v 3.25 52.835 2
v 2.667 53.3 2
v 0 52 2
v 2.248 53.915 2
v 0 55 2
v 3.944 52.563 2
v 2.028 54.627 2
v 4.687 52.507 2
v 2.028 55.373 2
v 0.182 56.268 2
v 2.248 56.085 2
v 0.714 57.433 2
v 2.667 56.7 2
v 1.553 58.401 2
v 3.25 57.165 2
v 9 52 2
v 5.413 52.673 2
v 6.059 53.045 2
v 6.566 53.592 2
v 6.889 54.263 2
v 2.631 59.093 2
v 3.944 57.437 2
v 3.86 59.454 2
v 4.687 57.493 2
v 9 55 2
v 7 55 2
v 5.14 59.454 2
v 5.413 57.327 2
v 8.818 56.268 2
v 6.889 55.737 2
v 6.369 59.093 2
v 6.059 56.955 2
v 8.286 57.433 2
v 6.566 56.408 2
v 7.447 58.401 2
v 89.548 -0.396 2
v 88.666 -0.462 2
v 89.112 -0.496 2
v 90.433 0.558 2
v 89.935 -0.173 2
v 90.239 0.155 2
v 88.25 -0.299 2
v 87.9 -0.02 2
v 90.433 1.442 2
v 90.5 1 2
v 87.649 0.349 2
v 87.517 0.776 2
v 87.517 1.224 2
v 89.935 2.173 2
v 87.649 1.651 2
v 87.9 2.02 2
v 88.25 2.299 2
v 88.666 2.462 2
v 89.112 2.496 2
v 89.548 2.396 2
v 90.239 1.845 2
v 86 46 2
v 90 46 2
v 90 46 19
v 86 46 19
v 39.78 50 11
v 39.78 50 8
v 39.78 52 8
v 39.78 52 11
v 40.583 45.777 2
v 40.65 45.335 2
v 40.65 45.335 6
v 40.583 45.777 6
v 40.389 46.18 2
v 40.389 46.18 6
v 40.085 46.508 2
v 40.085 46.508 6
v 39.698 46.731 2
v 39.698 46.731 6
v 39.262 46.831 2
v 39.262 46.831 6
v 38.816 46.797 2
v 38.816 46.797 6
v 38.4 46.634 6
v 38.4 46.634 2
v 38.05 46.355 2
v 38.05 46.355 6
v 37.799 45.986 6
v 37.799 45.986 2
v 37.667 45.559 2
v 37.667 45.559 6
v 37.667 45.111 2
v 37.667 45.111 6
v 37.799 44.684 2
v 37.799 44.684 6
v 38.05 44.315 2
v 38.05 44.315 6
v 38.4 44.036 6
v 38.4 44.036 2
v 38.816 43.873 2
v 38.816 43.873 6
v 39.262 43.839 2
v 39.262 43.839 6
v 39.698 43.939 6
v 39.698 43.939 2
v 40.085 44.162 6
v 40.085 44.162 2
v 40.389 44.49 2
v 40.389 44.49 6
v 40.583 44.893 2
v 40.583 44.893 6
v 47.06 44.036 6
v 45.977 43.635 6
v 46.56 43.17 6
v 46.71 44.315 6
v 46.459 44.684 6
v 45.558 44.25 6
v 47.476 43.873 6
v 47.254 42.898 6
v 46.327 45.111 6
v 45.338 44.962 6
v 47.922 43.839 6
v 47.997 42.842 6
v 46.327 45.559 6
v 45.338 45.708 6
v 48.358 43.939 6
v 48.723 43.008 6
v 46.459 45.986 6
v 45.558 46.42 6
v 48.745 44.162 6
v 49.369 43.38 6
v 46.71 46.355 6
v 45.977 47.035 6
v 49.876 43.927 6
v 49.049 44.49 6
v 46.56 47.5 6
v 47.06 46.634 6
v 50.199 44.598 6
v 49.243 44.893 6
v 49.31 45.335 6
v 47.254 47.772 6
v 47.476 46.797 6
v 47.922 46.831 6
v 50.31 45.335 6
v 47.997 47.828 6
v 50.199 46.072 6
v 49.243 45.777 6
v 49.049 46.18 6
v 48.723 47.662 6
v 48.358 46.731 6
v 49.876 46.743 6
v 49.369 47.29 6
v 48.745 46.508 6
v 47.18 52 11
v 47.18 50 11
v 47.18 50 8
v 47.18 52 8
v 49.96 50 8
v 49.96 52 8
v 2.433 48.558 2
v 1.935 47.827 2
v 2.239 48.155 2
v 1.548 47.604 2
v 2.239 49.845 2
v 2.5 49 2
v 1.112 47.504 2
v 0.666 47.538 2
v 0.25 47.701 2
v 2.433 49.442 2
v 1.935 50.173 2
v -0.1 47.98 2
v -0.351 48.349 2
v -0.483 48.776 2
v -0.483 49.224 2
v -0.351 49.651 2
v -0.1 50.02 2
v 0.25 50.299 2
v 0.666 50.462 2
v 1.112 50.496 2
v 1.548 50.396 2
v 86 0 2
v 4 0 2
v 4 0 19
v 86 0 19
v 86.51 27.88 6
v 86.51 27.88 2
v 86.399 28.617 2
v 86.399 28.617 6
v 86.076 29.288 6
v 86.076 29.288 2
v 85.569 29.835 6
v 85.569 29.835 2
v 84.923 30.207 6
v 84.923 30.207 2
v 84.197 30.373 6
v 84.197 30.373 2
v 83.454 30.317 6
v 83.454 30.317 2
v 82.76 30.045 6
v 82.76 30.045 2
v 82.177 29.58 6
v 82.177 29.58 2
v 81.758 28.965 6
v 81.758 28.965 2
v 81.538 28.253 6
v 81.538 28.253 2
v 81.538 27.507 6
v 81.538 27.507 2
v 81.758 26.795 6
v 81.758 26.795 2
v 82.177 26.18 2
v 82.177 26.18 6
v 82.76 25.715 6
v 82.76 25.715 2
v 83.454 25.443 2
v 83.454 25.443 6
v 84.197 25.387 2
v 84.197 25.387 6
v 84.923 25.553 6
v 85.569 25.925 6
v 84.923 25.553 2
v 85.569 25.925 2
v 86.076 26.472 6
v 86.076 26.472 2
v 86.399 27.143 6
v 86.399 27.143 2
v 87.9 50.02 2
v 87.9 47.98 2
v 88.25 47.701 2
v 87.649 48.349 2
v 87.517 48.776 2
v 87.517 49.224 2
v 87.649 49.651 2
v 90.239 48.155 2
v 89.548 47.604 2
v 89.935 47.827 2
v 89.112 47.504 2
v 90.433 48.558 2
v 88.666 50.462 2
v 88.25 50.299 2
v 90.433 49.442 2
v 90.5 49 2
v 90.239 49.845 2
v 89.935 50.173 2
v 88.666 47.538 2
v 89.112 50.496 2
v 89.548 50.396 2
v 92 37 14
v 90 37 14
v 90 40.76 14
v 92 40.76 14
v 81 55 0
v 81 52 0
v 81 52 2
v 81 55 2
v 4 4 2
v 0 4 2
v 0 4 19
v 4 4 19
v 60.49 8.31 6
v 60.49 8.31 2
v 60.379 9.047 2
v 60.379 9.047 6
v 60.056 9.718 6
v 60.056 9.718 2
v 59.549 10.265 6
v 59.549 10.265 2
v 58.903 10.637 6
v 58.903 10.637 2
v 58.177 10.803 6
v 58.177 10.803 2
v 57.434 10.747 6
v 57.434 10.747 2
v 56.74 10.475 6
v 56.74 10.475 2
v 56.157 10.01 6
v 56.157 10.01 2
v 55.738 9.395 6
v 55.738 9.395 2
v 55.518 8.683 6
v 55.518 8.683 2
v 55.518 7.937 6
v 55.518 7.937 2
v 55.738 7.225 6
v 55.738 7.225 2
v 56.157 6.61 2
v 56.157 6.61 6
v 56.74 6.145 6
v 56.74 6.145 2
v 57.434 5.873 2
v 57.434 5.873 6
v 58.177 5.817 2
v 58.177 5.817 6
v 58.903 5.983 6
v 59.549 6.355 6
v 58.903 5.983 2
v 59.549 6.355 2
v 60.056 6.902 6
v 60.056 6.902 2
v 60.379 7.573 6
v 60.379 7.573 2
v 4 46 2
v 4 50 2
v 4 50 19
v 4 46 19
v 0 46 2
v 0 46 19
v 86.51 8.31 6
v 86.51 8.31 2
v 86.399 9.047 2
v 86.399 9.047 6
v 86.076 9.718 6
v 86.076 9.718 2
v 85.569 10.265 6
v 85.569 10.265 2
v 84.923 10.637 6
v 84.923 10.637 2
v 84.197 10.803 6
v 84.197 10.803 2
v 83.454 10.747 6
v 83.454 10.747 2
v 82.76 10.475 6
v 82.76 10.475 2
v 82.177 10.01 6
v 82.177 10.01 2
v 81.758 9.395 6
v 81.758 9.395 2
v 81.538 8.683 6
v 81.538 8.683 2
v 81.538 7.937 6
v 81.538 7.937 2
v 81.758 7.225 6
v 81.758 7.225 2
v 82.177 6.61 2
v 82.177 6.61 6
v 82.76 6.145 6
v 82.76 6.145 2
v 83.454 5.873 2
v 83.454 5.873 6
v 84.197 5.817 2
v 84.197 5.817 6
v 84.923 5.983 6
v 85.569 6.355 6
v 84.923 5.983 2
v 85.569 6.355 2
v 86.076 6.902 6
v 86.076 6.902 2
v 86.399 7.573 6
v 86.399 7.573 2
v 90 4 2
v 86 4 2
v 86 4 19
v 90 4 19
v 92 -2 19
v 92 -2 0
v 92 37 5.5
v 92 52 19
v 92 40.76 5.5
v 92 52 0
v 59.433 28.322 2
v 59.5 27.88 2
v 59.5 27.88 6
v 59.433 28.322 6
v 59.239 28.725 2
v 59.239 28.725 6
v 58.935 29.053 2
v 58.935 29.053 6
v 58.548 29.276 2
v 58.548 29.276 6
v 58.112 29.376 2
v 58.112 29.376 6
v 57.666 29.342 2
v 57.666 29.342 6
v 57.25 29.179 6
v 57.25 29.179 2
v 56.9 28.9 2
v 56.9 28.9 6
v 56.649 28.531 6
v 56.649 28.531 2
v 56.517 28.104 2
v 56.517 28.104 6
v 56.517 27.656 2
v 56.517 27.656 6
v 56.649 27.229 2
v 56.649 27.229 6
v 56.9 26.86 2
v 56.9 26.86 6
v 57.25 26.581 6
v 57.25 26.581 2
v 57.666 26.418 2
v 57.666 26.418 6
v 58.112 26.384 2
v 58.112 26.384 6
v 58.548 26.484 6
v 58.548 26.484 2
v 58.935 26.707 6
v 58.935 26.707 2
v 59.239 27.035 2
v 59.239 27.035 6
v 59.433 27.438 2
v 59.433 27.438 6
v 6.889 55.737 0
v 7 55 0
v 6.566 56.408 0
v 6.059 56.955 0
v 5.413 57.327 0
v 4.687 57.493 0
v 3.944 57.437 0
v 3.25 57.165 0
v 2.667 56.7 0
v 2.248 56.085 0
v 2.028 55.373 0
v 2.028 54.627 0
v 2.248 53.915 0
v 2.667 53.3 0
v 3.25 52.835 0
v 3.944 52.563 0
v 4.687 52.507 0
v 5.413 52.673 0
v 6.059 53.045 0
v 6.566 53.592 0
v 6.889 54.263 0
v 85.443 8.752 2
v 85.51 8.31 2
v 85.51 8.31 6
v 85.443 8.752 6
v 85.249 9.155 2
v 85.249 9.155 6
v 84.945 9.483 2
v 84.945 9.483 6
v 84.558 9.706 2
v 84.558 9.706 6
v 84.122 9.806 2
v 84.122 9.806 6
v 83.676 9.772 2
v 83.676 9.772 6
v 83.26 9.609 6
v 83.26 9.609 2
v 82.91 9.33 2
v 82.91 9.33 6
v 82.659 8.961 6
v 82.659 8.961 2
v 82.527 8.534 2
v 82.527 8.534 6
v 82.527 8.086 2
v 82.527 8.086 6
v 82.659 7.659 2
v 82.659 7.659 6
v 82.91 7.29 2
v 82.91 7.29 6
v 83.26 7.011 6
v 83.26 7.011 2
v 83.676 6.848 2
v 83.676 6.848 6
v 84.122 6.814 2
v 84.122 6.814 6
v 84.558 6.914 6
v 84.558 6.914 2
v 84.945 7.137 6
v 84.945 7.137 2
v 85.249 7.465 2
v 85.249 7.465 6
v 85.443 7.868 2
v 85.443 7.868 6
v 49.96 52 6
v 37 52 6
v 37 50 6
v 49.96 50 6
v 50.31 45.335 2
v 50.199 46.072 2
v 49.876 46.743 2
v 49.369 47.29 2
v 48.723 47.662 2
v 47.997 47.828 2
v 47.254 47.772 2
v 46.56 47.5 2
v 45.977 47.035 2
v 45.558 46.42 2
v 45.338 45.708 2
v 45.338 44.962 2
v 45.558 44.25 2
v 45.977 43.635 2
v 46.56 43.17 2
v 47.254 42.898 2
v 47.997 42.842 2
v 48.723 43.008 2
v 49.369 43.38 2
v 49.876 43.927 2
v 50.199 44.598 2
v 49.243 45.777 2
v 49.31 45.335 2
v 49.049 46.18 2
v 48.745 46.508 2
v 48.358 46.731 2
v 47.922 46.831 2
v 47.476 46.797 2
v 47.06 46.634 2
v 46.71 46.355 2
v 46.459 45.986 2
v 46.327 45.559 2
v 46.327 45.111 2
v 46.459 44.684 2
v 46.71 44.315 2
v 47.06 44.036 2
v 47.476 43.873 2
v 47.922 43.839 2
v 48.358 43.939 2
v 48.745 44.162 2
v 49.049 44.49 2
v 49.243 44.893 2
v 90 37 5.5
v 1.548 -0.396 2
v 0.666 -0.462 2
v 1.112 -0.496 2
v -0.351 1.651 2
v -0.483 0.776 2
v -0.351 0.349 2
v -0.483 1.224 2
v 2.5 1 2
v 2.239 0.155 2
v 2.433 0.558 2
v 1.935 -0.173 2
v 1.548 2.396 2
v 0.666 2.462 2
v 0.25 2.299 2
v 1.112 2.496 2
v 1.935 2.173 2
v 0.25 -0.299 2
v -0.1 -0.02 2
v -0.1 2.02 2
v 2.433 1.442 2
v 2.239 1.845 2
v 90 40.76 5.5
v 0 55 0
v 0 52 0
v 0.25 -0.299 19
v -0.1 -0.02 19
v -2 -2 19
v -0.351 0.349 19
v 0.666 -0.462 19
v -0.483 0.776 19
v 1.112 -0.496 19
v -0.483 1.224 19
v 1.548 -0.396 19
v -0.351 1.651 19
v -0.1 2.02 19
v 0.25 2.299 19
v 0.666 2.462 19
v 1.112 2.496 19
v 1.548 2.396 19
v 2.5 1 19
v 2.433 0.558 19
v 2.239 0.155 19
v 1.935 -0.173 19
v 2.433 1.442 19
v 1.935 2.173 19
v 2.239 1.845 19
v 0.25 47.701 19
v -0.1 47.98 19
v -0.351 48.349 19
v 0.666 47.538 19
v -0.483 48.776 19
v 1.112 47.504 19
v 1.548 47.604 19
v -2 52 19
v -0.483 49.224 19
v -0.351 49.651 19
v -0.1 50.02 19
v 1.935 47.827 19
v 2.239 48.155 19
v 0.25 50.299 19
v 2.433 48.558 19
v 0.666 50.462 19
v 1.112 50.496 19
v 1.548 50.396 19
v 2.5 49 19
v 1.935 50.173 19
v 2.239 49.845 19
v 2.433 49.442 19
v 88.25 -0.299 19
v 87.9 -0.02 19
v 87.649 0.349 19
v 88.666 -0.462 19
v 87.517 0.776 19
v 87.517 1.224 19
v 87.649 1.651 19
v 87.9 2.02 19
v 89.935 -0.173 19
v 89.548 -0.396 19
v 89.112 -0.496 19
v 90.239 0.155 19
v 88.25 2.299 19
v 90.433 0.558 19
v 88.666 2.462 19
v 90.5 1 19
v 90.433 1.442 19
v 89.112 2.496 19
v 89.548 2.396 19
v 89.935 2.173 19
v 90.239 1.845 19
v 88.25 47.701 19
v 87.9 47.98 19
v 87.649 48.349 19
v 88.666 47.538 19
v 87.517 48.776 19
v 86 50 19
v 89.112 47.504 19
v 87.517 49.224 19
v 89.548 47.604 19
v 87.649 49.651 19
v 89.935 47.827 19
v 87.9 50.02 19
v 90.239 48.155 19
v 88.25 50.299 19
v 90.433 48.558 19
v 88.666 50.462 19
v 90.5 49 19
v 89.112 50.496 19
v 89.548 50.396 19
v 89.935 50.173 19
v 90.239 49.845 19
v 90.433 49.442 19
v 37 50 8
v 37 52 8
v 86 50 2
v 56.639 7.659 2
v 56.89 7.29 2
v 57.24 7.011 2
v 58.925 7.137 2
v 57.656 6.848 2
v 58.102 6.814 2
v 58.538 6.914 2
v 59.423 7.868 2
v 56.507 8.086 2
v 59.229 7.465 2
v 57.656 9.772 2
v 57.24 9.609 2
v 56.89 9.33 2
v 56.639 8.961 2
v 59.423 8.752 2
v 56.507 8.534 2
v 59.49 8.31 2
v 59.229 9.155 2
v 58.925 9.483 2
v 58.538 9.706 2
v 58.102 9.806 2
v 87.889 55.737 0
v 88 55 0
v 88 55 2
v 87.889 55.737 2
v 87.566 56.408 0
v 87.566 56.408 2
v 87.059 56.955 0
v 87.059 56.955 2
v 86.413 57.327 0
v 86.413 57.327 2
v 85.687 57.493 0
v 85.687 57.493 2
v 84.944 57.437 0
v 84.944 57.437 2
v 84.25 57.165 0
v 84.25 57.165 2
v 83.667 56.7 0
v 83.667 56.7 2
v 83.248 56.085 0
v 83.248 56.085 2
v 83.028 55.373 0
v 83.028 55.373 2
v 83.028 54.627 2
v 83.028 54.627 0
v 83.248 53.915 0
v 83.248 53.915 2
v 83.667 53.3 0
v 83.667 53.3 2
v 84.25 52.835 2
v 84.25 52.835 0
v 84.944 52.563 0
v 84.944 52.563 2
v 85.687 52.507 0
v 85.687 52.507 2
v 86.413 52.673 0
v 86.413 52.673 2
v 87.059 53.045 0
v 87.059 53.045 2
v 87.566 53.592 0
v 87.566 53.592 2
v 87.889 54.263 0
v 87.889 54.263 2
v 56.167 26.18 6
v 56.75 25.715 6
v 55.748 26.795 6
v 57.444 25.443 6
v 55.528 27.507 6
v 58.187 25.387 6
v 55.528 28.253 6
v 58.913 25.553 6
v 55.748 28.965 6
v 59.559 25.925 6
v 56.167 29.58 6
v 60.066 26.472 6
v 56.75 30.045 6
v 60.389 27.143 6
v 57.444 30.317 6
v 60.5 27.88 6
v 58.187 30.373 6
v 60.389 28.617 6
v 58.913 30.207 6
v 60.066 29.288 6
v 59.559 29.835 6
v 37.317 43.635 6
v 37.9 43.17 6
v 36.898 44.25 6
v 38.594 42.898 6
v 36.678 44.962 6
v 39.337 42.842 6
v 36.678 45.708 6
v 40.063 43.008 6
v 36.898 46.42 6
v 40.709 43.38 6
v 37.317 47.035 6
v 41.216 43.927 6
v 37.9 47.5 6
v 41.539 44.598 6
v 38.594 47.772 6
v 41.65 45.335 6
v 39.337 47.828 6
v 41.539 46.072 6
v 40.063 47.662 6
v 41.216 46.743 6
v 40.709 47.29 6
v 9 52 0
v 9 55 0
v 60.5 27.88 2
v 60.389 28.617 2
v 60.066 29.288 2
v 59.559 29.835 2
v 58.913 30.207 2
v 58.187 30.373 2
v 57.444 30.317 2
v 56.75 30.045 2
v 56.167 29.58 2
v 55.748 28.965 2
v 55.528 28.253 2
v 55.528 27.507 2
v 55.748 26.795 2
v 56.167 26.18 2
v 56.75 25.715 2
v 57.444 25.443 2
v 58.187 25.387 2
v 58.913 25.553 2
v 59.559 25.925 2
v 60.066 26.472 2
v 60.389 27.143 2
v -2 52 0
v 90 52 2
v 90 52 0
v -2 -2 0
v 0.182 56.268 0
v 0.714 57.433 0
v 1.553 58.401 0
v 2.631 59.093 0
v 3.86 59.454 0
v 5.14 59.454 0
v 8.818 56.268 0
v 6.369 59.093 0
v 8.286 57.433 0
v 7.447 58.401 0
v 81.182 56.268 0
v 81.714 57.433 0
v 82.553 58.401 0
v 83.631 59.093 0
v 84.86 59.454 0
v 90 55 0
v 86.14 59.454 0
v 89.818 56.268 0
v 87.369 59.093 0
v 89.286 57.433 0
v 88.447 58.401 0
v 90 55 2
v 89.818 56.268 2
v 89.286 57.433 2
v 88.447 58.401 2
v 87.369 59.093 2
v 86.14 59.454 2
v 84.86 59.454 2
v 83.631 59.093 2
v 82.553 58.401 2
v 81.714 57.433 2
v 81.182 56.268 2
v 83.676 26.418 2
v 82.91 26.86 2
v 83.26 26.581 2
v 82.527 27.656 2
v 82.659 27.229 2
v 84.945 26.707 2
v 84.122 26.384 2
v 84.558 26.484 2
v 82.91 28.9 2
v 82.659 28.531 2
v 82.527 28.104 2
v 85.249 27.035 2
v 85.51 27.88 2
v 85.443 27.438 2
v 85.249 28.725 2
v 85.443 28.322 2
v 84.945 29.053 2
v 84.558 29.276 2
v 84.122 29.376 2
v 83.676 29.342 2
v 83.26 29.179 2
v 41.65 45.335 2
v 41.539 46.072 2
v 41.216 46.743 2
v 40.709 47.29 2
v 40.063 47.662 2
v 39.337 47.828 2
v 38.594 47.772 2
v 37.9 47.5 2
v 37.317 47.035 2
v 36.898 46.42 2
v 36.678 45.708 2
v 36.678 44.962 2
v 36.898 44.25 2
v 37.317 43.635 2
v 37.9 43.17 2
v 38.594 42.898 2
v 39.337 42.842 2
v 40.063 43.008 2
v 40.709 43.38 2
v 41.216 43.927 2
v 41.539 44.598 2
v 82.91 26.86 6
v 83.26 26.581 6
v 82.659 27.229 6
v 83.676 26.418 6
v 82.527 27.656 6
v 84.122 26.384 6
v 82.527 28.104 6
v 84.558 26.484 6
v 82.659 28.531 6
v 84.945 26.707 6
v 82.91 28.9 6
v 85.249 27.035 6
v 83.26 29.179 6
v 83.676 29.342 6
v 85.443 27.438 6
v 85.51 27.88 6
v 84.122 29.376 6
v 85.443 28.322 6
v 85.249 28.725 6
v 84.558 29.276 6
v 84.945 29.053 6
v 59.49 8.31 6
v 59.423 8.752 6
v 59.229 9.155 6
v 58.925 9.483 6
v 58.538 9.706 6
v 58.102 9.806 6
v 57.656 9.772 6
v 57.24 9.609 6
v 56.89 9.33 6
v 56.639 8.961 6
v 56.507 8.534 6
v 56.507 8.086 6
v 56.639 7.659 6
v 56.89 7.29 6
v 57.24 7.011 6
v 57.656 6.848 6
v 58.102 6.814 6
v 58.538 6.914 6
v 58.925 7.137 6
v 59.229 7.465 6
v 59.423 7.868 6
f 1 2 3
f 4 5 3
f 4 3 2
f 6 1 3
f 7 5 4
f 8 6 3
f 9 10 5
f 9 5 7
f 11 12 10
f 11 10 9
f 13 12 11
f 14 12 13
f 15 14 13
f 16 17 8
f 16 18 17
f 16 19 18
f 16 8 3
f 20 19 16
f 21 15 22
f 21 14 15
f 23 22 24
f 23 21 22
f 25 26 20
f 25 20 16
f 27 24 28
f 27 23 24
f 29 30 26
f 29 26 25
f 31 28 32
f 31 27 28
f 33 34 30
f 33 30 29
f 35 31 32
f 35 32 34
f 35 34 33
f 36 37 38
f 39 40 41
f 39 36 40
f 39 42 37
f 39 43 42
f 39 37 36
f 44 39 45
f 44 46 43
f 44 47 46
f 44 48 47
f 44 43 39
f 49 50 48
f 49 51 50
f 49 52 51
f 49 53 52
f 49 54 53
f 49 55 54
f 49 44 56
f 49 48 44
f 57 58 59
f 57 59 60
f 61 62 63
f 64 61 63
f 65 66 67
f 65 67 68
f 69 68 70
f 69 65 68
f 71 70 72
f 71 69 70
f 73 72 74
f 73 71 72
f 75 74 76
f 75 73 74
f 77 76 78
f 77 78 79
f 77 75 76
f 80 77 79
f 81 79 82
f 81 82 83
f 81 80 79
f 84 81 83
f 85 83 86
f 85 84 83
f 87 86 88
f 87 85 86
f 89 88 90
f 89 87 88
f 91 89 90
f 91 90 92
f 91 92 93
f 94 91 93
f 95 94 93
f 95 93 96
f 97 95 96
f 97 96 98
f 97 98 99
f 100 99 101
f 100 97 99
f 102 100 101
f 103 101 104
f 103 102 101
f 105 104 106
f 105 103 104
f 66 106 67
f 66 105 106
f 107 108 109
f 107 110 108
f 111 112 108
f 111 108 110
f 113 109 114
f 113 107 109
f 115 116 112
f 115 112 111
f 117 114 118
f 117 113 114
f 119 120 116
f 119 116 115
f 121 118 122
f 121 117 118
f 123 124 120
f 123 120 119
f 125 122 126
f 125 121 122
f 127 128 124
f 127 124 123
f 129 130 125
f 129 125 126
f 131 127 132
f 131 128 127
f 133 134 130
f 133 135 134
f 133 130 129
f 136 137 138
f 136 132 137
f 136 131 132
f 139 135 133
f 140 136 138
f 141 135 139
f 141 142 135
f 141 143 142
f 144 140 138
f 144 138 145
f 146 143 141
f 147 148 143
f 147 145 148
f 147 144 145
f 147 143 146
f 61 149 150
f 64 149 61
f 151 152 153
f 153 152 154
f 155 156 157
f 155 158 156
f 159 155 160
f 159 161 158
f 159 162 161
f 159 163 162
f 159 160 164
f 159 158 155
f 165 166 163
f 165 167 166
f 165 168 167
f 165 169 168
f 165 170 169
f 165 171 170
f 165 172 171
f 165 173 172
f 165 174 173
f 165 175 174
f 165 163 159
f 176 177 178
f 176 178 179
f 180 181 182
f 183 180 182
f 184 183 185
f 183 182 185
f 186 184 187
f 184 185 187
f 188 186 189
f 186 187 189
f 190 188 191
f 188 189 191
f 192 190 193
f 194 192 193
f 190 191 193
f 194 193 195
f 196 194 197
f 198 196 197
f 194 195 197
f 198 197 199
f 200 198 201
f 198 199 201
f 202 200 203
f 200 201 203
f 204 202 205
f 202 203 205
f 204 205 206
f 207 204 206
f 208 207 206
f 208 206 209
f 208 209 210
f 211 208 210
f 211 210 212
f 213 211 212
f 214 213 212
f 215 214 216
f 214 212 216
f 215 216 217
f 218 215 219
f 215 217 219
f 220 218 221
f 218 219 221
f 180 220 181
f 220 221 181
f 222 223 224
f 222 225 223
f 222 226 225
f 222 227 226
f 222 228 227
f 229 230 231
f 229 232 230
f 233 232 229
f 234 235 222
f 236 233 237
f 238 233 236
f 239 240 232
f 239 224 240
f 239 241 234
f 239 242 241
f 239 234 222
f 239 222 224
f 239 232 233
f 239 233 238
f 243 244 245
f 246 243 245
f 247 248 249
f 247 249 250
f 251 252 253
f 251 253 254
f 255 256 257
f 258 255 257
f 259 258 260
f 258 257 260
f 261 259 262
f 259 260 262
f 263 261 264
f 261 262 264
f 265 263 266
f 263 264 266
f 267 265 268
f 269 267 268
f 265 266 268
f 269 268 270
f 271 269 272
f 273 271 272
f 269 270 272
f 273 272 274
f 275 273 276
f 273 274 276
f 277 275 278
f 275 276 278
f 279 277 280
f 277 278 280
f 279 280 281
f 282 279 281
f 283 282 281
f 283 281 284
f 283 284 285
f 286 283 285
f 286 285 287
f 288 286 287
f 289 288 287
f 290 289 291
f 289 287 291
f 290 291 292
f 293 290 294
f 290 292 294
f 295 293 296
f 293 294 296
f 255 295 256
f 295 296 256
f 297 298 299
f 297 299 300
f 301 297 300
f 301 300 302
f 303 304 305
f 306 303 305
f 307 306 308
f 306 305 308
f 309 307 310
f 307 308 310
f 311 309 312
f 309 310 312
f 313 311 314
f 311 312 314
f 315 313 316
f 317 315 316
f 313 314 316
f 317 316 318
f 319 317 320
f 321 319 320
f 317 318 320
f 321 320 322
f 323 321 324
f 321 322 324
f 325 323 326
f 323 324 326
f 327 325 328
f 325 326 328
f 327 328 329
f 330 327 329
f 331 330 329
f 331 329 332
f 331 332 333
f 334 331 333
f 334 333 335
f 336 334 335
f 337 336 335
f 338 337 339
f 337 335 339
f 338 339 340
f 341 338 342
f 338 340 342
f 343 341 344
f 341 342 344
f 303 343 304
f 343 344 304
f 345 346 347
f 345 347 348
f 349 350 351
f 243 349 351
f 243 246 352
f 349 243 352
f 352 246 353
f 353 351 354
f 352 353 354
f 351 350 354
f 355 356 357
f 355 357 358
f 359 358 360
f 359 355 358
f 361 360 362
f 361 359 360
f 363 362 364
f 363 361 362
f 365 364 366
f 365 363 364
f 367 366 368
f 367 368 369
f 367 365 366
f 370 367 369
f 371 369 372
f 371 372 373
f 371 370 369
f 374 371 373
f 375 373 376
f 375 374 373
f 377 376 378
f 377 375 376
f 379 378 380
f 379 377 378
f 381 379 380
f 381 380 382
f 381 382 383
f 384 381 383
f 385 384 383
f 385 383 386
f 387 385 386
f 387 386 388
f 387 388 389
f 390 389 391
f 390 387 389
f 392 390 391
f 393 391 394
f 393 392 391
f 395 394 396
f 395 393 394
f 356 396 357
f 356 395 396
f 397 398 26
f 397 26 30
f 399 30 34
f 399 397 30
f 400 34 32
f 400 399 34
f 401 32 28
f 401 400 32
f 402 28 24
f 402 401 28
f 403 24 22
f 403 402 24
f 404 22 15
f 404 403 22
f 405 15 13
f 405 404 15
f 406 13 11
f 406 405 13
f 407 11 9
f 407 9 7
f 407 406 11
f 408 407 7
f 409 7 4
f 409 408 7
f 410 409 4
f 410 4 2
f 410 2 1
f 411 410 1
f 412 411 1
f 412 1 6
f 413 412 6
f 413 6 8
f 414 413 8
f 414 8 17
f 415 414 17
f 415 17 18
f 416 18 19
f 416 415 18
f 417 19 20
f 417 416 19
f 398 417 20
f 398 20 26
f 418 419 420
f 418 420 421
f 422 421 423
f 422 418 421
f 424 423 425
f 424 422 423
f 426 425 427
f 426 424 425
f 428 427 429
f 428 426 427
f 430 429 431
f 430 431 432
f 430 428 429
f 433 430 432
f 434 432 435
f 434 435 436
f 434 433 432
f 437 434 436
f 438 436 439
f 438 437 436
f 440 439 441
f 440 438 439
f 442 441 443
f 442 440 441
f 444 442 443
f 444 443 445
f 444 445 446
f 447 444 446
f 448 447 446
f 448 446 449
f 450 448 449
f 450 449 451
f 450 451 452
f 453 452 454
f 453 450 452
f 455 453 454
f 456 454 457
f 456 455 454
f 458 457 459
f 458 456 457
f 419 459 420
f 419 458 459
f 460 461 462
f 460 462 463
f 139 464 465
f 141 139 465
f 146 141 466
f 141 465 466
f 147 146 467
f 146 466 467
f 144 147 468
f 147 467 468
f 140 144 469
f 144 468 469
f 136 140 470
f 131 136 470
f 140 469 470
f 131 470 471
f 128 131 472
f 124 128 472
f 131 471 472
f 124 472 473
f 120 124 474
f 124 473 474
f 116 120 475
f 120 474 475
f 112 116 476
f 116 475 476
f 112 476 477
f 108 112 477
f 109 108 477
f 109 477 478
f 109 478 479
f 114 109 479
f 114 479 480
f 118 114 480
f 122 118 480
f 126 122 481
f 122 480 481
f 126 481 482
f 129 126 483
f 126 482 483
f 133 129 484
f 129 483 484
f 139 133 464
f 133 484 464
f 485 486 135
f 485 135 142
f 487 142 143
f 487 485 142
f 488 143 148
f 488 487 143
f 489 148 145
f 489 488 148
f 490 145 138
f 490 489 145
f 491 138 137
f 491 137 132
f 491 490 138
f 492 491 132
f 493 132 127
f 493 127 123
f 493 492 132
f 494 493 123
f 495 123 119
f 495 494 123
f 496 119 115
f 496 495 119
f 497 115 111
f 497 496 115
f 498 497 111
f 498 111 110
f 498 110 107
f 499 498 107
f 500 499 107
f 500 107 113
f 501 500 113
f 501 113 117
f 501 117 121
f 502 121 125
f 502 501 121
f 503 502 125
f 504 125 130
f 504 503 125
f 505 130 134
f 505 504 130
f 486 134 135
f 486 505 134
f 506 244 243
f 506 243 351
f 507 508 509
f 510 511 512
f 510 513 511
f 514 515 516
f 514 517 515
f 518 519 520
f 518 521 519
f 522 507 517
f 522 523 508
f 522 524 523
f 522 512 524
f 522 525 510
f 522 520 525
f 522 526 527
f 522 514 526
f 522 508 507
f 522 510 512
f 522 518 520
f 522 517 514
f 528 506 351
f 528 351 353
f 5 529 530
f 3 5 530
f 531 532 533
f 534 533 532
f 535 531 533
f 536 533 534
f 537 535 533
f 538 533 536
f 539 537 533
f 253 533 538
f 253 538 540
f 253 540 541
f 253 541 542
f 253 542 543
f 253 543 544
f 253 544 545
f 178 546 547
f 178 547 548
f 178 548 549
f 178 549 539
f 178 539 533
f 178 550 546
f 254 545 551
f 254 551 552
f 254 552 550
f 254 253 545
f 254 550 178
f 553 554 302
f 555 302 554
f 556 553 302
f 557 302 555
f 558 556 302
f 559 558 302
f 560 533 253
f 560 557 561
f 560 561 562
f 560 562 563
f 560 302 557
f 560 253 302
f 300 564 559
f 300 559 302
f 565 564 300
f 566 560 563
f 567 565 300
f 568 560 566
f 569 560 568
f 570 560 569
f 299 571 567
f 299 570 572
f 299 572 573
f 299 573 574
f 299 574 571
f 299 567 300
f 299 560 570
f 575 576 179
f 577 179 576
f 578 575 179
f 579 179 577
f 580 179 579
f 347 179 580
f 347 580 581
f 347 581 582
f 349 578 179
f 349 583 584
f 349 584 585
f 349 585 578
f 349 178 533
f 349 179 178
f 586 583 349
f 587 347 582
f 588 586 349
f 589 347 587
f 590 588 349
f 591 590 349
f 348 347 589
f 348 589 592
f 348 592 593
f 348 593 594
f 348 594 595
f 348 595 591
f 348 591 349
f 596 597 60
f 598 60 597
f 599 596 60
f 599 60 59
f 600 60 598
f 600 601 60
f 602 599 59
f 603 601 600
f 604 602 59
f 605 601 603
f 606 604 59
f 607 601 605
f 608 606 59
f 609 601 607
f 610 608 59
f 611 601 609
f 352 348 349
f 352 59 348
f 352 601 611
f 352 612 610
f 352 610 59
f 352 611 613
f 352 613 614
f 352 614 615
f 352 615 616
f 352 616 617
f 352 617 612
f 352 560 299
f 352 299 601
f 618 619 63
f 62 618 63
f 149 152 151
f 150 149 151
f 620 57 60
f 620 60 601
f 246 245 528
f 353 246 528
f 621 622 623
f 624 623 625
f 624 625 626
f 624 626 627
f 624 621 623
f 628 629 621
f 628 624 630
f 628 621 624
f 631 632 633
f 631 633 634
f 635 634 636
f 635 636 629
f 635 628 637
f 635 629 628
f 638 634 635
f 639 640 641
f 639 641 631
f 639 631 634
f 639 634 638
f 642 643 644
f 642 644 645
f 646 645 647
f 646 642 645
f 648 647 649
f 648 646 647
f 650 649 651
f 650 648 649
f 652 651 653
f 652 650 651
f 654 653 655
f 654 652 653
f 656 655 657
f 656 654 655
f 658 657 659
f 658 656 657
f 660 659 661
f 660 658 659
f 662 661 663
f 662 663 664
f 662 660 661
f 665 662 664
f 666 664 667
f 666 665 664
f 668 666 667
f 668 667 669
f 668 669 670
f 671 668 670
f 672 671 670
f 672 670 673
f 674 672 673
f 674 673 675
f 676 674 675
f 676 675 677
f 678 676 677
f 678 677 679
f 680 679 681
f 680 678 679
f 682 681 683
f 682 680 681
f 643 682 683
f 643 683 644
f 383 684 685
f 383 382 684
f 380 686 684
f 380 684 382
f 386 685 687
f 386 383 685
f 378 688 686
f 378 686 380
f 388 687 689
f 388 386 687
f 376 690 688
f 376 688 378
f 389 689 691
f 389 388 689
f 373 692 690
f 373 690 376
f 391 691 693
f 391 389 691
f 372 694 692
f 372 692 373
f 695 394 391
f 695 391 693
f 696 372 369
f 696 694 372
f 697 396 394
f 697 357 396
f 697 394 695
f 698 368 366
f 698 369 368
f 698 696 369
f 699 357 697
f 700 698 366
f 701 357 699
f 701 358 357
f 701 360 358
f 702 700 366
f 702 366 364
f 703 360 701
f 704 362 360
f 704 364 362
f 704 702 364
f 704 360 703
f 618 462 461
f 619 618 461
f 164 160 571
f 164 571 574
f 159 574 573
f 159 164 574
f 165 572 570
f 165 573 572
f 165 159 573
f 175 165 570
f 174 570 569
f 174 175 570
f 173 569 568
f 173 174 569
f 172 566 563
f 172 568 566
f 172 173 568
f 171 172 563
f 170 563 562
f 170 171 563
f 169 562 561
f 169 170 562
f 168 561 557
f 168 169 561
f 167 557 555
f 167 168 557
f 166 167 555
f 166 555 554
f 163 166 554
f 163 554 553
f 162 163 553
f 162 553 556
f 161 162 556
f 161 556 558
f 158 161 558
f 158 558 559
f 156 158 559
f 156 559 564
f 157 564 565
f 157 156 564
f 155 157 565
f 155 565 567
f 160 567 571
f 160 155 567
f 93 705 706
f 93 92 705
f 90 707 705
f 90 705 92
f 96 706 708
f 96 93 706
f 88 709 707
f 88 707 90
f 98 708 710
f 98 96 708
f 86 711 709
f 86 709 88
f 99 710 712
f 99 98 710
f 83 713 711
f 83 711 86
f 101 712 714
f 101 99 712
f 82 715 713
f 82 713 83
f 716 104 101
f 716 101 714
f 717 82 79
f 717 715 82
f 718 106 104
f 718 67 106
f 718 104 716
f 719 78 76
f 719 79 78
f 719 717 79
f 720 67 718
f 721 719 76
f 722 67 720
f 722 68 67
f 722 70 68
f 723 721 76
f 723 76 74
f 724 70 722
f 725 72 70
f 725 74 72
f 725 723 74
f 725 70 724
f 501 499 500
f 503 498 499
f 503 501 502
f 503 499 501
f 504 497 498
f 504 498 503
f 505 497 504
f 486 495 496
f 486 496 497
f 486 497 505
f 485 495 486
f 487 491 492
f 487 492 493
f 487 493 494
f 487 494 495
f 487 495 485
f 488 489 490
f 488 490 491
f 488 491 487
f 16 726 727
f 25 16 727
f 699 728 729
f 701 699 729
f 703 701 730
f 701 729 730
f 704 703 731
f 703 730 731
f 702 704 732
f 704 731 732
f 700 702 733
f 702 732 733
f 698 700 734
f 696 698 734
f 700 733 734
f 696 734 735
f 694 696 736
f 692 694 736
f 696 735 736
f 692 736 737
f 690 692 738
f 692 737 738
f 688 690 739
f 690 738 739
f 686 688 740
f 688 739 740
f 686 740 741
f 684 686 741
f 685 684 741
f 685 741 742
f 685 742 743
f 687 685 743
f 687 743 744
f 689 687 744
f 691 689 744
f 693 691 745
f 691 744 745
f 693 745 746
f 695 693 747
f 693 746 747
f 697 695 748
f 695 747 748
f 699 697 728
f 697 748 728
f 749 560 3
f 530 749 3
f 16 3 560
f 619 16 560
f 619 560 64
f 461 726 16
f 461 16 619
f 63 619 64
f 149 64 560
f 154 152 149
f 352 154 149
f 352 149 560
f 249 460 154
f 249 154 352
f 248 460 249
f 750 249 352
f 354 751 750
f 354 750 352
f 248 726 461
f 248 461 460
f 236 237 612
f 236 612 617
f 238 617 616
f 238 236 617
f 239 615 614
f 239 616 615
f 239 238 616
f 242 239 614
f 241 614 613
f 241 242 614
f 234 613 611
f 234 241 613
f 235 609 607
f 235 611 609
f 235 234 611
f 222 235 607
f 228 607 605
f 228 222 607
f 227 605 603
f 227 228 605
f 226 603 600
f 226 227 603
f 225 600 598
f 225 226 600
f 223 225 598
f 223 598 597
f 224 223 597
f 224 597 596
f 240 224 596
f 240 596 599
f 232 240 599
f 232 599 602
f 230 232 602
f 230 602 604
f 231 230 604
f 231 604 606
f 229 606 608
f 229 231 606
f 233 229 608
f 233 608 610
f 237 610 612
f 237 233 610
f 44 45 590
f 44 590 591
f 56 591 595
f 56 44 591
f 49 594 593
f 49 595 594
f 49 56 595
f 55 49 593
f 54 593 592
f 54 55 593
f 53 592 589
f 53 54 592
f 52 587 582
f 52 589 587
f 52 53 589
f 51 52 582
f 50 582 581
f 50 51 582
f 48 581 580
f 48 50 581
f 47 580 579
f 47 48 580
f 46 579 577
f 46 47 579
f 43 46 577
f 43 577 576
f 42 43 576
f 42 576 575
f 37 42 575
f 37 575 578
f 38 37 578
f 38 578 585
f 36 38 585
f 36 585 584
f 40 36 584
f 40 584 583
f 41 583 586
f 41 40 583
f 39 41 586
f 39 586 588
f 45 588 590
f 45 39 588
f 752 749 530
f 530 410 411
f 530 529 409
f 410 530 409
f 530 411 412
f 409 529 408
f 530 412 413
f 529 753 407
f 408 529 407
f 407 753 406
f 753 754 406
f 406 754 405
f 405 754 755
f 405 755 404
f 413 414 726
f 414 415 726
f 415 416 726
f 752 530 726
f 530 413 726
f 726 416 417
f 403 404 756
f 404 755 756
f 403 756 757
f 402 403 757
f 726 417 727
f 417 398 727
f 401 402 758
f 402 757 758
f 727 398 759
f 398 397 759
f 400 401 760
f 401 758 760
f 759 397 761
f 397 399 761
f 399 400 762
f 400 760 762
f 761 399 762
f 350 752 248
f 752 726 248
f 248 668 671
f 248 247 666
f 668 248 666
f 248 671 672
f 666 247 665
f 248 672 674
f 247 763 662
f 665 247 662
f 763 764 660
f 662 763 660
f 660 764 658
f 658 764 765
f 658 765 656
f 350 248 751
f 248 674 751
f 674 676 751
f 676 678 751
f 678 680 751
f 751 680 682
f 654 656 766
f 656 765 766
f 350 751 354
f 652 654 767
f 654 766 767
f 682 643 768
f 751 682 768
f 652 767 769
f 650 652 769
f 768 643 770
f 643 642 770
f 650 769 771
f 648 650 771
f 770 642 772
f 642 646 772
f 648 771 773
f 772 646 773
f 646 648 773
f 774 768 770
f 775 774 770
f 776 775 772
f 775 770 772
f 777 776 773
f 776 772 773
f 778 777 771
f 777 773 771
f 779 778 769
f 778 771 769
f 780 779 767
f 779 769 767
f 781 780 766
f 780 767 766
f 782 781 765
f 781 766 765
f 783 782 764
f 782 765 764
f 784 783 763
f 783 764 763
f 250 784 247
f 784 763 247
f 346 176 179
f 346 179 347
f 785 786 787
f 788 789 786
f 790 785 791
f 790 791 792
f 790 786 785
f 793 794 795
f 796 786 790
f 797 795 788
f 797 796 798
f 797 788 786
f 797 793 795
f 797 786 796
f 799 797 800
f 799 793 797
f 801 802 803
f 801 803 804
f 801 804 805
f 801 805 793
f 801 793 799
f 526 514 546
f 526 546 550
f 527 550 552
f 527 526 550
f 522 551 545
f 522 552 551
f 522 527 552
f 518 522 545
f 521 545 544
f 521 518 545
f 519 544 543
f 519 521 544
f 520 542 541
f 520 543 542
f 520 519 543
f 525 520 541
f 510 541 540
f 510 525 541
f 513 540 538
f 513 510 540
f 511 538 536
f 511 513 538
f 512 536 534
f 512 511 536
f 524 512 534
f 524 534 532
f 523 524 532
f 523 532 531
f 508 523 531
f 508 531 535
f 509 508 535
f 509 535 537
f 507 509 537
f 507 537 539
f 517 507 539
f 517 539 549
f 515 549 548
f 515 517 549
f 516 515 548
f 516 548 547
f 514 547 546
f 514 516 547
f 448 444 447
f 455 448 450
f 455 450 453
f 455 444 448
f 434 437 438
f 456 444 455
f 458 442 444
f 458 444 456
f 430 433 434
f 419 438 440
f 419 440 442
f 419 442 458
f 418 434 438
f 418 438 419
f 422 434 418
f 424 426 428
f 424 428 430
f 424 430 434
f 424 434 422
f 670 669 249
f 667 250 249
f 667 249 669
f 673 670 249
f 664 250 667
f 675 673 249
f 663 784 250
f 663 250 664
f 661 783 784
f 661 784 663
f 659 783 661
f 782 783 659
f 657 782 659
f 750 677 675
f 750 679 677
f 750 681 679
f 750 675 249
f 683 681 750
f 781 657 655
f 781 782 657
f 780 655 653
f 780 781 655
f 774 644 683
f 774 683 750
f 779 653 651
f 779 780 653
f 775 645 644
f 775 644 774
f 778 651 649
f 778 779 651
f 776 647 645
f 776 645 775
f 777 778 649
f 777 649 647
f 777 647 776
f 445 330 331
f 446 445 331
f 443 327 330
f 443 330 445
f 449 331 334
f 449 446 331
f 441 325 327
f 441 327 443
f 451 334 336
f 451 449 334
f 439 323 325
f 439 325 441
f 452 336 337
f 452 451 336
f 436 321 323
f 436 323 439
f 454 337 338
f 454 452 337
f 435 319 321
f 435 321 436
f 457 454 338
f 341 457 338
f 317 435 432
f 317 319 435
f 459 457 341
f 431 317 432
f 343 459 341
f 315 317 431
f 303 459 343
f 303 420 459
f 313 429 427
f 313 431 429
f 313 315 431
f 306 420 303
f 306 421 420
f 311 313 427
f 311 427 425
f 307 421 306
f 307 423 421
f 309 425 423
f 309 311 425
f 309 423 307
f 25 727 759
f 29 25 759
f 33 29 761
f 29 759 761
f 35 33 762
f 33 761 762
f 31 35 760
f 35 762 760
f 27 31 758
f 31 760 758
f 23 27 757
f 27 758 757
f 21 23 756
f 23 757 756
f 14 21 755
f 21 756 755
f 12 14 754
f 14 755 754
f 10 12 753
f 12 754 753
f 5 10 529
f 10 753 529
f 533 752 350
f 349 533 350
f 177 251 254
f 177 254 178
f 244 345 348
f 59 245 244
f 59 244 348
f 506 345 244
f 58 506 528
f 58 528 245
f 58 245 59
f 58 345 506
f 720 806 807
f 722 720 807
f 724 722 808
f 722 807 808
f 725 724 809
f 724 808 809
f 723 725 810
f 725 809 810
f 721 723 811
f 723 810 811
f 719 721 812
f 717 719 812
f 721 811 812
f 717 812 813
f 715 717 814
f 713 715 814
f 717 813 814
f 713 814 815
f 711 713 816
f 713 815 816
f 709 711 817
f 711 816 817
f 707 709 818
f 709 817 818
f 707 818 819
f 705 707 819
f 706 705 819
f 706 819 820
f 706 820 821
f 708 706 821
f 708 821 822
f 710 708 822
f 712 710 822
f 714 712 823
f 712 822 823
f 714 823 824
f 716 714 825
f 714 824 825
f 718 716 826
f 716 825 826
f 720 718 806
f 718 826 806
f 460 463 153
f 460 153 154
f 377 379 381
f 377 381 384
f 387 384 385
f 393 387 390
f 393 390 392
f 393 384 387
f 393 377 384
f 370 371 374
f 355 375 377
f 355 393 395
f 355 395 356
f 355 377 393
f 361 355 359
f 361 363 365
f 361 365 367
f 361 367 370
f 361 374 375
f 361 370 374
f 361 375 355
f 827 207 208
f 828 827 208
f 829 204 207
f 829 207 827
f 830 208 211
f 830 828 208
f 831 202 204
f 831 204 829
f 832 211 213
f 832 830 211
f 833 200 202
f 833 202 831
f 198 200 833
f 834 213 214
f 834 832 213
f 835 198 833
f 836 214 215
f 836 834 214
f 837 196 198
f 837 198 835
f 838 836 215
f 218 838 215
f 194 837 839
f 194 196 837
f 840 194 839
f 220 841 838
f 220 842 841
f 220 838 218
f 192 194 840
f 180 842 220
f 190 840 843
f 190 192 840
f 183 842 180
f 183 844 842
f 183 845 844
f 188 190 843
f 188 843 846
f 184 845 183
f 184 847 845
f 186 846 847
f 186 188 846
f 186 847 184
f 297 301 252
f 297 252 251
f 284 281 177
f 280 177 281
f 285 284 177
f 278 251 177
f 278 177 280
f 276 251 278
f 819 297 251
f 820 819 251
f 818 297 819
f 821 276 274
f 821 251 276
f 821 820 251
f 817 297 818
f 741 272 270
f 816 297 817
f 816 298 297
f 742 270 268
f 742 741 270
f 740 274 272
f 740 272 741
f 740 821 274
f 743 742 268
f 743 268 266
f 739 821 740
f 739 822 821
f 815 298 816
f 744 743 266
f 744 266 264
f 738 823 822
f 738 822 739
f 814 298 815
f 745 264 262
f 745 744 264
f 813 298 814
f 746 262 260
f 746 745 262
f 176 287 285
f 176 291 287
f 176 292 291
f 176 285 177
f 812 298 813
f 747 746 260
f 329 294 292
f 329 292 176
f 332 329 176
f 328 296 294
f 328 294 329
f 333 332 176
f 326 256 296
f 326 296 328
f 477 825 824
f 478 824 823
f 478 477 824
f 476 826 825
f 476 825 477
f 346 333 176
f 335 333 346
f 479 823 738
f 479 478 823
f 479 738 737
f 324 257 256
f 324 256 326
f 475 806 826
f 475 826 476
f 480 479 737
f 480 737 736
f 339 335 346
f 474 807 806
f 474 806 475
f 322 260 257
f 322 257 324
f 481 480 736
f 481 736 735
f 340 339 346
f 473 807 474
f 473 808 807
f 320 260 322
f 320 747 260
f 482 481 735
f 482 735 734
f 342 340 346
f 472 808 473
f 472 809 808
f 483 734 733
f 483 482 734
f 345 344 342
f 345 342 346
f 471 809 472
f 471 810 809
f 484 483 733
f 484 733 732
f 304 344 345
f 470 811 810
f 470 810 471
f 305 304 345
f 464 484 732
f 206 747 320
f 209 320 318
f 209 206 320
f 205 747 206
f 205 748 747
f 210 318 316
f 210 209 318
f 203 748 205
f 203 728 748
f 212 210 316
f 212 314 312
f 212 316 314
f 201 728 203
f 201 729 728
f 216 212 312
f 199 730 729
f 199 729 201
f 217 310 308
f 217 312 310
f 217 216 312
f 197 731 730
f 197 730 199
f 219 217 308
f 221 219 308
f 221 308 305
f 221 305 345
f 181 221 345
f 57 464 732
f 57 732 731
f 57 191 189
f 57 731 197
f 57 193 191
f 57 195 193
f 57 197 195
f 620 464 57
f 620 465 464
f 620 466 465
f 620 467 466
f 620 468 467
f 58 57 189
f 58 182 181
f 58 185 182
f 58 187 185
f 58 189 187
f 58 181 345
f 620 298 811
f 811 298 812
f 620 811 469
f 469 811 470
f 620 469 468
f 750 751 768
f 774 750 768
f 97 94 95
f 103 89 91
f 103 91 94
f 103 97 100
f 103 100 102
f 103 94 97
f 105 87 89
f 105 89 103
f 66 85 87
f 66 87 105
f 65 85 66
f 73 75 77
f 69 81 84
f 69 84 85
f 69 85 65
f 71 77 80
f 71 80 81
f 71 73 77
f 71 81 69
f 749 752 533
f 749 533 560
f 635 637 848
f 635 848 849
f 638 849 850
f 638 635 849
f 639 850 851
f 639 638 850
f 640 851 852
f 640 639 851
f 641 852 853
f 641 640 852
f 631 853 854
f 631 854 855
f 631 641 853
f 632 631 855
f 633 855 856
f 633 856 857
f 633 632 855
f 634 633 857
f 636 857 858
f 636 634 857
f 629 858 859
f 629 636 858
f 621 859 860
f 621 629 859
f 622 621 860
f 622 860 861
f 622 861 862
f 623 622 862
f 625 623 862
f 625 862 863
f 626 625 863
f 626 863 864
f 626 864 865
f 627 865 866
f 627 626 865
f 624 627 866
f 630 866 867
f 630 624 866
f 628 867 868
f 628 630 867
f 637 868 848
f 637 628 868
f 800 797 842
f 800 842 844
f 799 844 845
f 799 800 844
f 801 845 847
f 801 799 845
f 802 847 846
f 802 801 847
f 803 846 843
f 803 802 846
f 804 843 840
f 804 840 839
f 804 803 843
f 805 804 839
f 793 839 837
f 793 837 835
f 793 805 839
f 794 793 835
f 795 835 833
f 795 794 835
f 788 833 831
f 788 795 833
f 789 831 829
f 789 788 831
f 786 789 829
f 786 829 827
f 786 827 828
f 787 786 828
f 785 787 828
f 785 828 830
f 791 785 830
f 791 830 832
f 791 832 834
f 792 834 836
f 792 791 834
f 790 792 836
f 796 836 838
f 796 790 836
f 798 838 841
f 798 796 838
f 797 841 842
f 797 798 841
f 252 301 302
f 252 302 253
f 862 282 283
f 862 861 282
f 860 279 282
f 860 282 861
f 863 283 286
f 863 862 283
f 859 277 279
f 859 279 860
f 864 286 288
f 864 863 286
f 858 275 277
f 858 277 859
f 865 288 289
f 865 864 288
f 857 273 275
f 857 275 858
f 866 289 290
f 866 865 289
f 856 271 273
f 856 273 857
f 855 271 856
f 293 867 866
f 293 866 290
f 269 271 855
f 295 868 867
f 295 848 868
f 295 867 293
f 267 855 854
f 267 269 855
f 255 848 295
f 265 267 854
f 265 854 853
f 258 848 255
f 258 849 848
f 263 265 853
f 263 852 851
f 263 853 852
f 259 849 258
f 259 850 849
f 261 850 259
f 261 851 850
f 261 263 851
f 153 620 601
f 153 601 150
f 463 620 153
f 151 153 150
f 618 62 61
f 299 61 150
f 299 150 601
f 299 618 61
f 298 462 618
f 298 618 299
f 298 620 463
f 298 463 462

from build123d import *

# Parameters (mm, degrees)
EXTRUDE045_DEPTH     = 2
SKETCH030_R          = 1.5
EXTRUDE031_DEPTH     = 4
SKETCH031_R          = 2.5
EXTRUDE030_DEPTH     = 4
SKETCH024_R          = 2.5
EXTRUDE024_DEPTH     = 2
SKETCH025_R          = 1.5
EXTRUDE027_DEPTH     = 4
SKETCH026_R          = 2.5
EXTRUDE026_DEPTH     = 4
SKETCH029_R          = 1.5
EXTRUDE029_DEPTH     = 20
EXTRUDE001_DEPTH     = 3
SKETCH_W             = 12.96
SKETCH_H             = 14.18
SKETCH_R             = 0.25
SKETCH_R_2           = 1.65
EXTRUDE_DEPTH        = 2
SKETCH013_W          = 8.5
SKETCH013_H          = 3.76
EXTRUDE013_DEPTH     = 3.54
SKETCH014_W          = 5
SKETCH014_H          = 1.5
EXTRUDE014_DEPTH     = 2.97
SKETCH012_W          = 16.69
SKETCH012_H          = 12.65
EXTRUDE012_DEPTH     = 1.66
LINK_PLACEMENT_ANGLE = 90
SKETCH027_W          = 94
SKETCH027_H          = 54
EXTRUDE025_DEPTH     = 19


with BuildPart() as extrude_controllercable_hole:
    # Sketch044 → Extrude045 (new body)
    with BuildSketch(Plane.XZ):
        with BuildLine():
            Line((-3.5, 7), (3.5, 7))
            Line((3.5, 7), (3.5, 0))
            ThreePointArc((-3.5, 0), (0, -3.5), (3.5, 0))
            Line((-3.5, 0), (-3.5, 7))
        make_face()
    extrude(amount=EXTRUDE045_DEPTH)


with BuildPart() as extrude_controllercable_hole_1:
    # Extrude045 placement: moved
    add(extrude_controllercable_hole.part.moved(Location((24, 52, 23))))


with BuildPart() as extrude_microusbbreakout_holes:
    # Sketch030 → Extrude031 (new body)
    with BuildSketch(Plane.XY):
        with Locations((2.15, 7.435)):
            Circle(SKETCH030_R)
        with Locations((10.81, 7.435)):
            Circle(SKETCH030_R)
    extrude(amount=EXTRUDE031_DEPTH)


with BuildPart() as cut_microusbbreakout_stand:
    # Sketch031 → Extrude030 (new body)
    with BuildSketch(Plane.XY):
        with Locations((2.15, 7.435)):
            Circle(SKETCH031_R)
        with Locations((10.81, 7.435)):
            Circle(SKETCH031_R)
    extrude(amount=EXTRUDE030_DEPTH)

    # Cut004: cut Extrude_MicroUSBBreakout_holes
    add(extrude_microusbbreakout_holes.part, mode=Mode.SUBTRACT)


with BuildPart() as cut_microusbbreakout_stand_1:
    # Cut004 placement: moved
    add(cut_microusbbreakout_stand.part.moved(Location((37, 37.9, 2))))


with BuildPart() as extrude_controllercase_base:
    # Sketch024 → Extrude024 (new body)
    with BuildSketch(Plane.XY):
        with BuildLine():
            Line((0, 0), (90, 0))
            Line((90, 0), (90, 50))
            Line((90, 50), (90, 55))
            ThreePointArc((90, 55), (85.5, 59.5), (81, 55))
            Line((81, 50), (81, 55))
            Line((81, 50), (9, 50))
            Line((9, 50), (9, 55))
            ThreePointArc((9, 55), (4.5, 59.5), (0, 55))
            Line((0, 50), (0, 55))
            Line((0, 50), (0, 0))
        make_face()
        with Locations((85.5, 55)):
            Circle(SKETCH024_R, mode=Mode.SUBTRACT)
        with Locations((4.5, 55)):
            Circle(SKETCH024_R, mode=Mode.SUBTRACT)
    extrude(amount=EXTRUDE024_DEPTH)


with BuildPart() as extrude_mainboardcase_joystick_hole:
    # Sketch025 → Extrude027 (new body)
    with BuildSketch(Plane(origin=(53, 3, 0), x_dir=(1, 0, 0), z_dir=(0, 0, 1))):
        with Locations((-48, 19.88)):
            Circle(SKETCH025_R)
        with Locations((-21.99, 19.88)):
            Circle(SKETCH025_R)
        with Locations((-48.01, 0.31)):
            Circle(SKETCH025_R)
        with Locations((-21.99, 0.31)):
            Circle(SKETCH025_R)
    extrude(amount=EXTRUDE027_DEPTH)


with BuildPart() as fusion_controllercase_base:
    # Sketch026 → Extrude026 (new body)
    with BuildSketch(Plane.XY):
        with Locations((5, 22.88)):
            Circle(SKETCH026_R)
        with Locations((31.01, 22.88)):
            Circle(SKETCH026_R)
        with Locations((31.01, 3.31)):
            Circle(SKETCH026_R)
        with Locations((4.99, 3.31)):
            Circle(SKETCH026_R)
    extrude(amount=EXTRUDE026_DEPTH)

    # Cut001: cut Extrude_MainBoardCase_JoyStick_Hole
    add(extrude_mainboardcase_joystick_hole.part, mode=Mode.SUBTRACT)


with BuildPart() as fusion_controllercase_base_1:
    # Cut001 placement: moved
    add(fusion_controllercase_base.part.moved(Location((53, 5, 2))))

    # Fusion007: union Cut_MicroUSBBreakout_stand, Extrude_ControllerCase_Base
    add(cut_microusbbreakout_stand_1.part)
    add(extrude_controllercase_base.part)


with BuildPart() as extrude_controllercase_wall_toholes:
    # Sketch029 → Extrude029 (new body)
    with BuildSketch(Plane.XY):
        with Locations((1, 49)):
            Circle(SKETCH029_R)
        with Locations((1, 1)):
            Circle(SKETCH029_R)
        with Locations((89, 1)):
            Circle(SKETCH029_R)
        with Locations((89, 49)):
            Circle(SKETCH029_R)
    extrude(amount=EXTRUDE029_DEPTH)


with BuildPart() as extrude_controllercase_wall_toholes_1:
    # Extrude029 placement: moved
    add(extrude_controllercase_wall_toholes.part.moved(Location((0, 0, 2))))


with BuildPart() as extrude_microusbbreakout_parts:
    # Sketch001 → Extrude001 (new body)
    with BuildSketch(Plane.XY):
        Polygon((10.18, 14.18), (10.18, 8.98), (2.78, 8.98), (2.78, 14.18), (6.48, 14.18), align=None)
    extrude(amount=EXTRUDE001_DEPTH)


with BuildPart() as extrude_microusbbreakout_parts_1:
    # Extrude001 placement: moved
    add(extrude_microusbbreakout_parts.part.moved(Location((0, 0, 2))))


with BuildPart() as fusion_microusbbreakout001:
    # Sketch → Extrude (new body)
    with BuildSketch(Plane.XY):
        with Locations((6.48, 7.09)):
            Rectangle(SKETCH_W, SKETCH_H)
        with Locations((1, 1)):
            Circle(SKETCH_R, mode=Mode.SUBTRACT)
        with Locations((3.74, 1)):
            Circle(SKETCH_R, mode=Mode.SUBTRACT)
        with Locations((6.48, 1)):
            Circle(SKETCH_R, mode=Mode.SUBTRACT)
        with Locations((9.22, 1)):
            Circle(SKETCH_R, mode=Mode.SUBTRACT)
        with Locations((11.96, 1)):
            Circle(SKETCH_R, mode=Mode.SUBTRACT)
        with Locations((2.15, 7.435)):
            Circle(SKETCH_R_2, mode=Mode.SUBTRACT)
        with Locations((10.81, 7.435)):
            Circle(SKETCH_R_2, mode=Mode.SUBTRACT)
    extrude(amount=EXTRUDE_DEPTH)

    # Fusion: union Extrude_MicroUSBBreakout_parts
    add(extrude_microusbbreakout_parts_1.part)


with BuildPart() as fusion_microusbbreakout001_1:
    # Fusion placement: moved
    add(fusion_microusbbreakout001.part.moved(Location((-20, 0, 0))))


with BuildPart() as fusion_microusbbreakout001_2:
    # Link002 placement: moved
    add(fusion_microusbbreakout001_1.part.moved(Location((57, 37.9, 6))))


with BuildPart() as extrude_switch_house:
    # Sketch013 → Extrude013 (new body)
    with BuildSketch(Plane.XY):
        with Locations((4.25, 1.88)):
            Rectangle(SKETCH013_W, SKETCH013_H)
    extrude(amount=EXTRUDE013_DEPTH)


with BuildPart() as extrude_switch:
    # Sketch014 → Extrude014 (new body)
    with BuildSketch(Plane.XY):
        with Locations((4.25, 1.88)):
            Rectangle(SKETCH014_W, SKETCH014_H)
    extrude(amount=EXTRUDE014_DEPTH)


with BuildPart() as extrude_switch_1:
    # Extrude014 placement: moved
    add(extrude_switch.part.moved(Location((0, 0, 3.54))))


with BuildPart() as link_switck:
    # Sketch012 → Extrude012 (new body)
    with BuildSketch(Plane(origin=(4, 2, 0), x_dir=(1, 0, 0), z_dir=(0, 0, 1))):
        Rectangle(SKETCH012_W, SKETCH012_H)
    extrude(amount=-EXTRUDE012_DEPTH)

    # Fusion004: union Extrude_Switch_house, Extrude_Switch_
    add(extrude_switch_house.part)
    add(extrude_switch_1.part)


with BuildPart() as link_switck_1:
    # Fusion004 placement: moved
    add(link_switck.part.moved(Location((-150, 0, 0))))


with BuildPart() as link_switck_2:
    # Link placement: moved
    add(link_switck_1.part.moved(Location((89, 37, -136))).rotate(Axis((89, 37, -136), (0, 1, 0)), LINK_PLACEMENT_ANGLE))


with BuildPart() as cut_controllercase_bottom:
    # Sketch027 → Extrude025 (new body)
    with BuildSketch(Plane.XY):
        with Locations((45, 25)):
            Rectangle(SKETCH027_W, SKETCH027_H)
        Polygon((86, 50), (4, 50), (4, 46), (0, 46), (0, 4), (4, 4), (4, 0), (86, 0), (86, 4), (90, 4), (90, 46), (86, 46), align=None, mode=Mode.SUBTRACT)
    extrude(amount=EXTRUDE025_DEPTH)

    # Cut005: cut Link_Switck
    add(link_switck_2.part, mode=Mode.SUBTRACT)

    # Cut006: cut Fusion_MicroUSBBreakout001
    add(fusion_microusbbreakout001_2.part, mode=Mode.SUBTRACT)

    # Cut007: cut Extrude_ControllerCase_Wall_ToHoles
    add(extrude_controllercase_wall_toholes_1.part, mode=Mode.SUBTRACT)

    # Fusion008: union Fusion_ControllerCase_Base
    add(fusion_controllercase_base_1.part)

    # Cut011: cut Extrude_ControllerCable_Hole
    add(extrude_controllercable_hole_1.part, mode=Mode.SUBTRACT)


solid = cut_controllercase_bottom.part
